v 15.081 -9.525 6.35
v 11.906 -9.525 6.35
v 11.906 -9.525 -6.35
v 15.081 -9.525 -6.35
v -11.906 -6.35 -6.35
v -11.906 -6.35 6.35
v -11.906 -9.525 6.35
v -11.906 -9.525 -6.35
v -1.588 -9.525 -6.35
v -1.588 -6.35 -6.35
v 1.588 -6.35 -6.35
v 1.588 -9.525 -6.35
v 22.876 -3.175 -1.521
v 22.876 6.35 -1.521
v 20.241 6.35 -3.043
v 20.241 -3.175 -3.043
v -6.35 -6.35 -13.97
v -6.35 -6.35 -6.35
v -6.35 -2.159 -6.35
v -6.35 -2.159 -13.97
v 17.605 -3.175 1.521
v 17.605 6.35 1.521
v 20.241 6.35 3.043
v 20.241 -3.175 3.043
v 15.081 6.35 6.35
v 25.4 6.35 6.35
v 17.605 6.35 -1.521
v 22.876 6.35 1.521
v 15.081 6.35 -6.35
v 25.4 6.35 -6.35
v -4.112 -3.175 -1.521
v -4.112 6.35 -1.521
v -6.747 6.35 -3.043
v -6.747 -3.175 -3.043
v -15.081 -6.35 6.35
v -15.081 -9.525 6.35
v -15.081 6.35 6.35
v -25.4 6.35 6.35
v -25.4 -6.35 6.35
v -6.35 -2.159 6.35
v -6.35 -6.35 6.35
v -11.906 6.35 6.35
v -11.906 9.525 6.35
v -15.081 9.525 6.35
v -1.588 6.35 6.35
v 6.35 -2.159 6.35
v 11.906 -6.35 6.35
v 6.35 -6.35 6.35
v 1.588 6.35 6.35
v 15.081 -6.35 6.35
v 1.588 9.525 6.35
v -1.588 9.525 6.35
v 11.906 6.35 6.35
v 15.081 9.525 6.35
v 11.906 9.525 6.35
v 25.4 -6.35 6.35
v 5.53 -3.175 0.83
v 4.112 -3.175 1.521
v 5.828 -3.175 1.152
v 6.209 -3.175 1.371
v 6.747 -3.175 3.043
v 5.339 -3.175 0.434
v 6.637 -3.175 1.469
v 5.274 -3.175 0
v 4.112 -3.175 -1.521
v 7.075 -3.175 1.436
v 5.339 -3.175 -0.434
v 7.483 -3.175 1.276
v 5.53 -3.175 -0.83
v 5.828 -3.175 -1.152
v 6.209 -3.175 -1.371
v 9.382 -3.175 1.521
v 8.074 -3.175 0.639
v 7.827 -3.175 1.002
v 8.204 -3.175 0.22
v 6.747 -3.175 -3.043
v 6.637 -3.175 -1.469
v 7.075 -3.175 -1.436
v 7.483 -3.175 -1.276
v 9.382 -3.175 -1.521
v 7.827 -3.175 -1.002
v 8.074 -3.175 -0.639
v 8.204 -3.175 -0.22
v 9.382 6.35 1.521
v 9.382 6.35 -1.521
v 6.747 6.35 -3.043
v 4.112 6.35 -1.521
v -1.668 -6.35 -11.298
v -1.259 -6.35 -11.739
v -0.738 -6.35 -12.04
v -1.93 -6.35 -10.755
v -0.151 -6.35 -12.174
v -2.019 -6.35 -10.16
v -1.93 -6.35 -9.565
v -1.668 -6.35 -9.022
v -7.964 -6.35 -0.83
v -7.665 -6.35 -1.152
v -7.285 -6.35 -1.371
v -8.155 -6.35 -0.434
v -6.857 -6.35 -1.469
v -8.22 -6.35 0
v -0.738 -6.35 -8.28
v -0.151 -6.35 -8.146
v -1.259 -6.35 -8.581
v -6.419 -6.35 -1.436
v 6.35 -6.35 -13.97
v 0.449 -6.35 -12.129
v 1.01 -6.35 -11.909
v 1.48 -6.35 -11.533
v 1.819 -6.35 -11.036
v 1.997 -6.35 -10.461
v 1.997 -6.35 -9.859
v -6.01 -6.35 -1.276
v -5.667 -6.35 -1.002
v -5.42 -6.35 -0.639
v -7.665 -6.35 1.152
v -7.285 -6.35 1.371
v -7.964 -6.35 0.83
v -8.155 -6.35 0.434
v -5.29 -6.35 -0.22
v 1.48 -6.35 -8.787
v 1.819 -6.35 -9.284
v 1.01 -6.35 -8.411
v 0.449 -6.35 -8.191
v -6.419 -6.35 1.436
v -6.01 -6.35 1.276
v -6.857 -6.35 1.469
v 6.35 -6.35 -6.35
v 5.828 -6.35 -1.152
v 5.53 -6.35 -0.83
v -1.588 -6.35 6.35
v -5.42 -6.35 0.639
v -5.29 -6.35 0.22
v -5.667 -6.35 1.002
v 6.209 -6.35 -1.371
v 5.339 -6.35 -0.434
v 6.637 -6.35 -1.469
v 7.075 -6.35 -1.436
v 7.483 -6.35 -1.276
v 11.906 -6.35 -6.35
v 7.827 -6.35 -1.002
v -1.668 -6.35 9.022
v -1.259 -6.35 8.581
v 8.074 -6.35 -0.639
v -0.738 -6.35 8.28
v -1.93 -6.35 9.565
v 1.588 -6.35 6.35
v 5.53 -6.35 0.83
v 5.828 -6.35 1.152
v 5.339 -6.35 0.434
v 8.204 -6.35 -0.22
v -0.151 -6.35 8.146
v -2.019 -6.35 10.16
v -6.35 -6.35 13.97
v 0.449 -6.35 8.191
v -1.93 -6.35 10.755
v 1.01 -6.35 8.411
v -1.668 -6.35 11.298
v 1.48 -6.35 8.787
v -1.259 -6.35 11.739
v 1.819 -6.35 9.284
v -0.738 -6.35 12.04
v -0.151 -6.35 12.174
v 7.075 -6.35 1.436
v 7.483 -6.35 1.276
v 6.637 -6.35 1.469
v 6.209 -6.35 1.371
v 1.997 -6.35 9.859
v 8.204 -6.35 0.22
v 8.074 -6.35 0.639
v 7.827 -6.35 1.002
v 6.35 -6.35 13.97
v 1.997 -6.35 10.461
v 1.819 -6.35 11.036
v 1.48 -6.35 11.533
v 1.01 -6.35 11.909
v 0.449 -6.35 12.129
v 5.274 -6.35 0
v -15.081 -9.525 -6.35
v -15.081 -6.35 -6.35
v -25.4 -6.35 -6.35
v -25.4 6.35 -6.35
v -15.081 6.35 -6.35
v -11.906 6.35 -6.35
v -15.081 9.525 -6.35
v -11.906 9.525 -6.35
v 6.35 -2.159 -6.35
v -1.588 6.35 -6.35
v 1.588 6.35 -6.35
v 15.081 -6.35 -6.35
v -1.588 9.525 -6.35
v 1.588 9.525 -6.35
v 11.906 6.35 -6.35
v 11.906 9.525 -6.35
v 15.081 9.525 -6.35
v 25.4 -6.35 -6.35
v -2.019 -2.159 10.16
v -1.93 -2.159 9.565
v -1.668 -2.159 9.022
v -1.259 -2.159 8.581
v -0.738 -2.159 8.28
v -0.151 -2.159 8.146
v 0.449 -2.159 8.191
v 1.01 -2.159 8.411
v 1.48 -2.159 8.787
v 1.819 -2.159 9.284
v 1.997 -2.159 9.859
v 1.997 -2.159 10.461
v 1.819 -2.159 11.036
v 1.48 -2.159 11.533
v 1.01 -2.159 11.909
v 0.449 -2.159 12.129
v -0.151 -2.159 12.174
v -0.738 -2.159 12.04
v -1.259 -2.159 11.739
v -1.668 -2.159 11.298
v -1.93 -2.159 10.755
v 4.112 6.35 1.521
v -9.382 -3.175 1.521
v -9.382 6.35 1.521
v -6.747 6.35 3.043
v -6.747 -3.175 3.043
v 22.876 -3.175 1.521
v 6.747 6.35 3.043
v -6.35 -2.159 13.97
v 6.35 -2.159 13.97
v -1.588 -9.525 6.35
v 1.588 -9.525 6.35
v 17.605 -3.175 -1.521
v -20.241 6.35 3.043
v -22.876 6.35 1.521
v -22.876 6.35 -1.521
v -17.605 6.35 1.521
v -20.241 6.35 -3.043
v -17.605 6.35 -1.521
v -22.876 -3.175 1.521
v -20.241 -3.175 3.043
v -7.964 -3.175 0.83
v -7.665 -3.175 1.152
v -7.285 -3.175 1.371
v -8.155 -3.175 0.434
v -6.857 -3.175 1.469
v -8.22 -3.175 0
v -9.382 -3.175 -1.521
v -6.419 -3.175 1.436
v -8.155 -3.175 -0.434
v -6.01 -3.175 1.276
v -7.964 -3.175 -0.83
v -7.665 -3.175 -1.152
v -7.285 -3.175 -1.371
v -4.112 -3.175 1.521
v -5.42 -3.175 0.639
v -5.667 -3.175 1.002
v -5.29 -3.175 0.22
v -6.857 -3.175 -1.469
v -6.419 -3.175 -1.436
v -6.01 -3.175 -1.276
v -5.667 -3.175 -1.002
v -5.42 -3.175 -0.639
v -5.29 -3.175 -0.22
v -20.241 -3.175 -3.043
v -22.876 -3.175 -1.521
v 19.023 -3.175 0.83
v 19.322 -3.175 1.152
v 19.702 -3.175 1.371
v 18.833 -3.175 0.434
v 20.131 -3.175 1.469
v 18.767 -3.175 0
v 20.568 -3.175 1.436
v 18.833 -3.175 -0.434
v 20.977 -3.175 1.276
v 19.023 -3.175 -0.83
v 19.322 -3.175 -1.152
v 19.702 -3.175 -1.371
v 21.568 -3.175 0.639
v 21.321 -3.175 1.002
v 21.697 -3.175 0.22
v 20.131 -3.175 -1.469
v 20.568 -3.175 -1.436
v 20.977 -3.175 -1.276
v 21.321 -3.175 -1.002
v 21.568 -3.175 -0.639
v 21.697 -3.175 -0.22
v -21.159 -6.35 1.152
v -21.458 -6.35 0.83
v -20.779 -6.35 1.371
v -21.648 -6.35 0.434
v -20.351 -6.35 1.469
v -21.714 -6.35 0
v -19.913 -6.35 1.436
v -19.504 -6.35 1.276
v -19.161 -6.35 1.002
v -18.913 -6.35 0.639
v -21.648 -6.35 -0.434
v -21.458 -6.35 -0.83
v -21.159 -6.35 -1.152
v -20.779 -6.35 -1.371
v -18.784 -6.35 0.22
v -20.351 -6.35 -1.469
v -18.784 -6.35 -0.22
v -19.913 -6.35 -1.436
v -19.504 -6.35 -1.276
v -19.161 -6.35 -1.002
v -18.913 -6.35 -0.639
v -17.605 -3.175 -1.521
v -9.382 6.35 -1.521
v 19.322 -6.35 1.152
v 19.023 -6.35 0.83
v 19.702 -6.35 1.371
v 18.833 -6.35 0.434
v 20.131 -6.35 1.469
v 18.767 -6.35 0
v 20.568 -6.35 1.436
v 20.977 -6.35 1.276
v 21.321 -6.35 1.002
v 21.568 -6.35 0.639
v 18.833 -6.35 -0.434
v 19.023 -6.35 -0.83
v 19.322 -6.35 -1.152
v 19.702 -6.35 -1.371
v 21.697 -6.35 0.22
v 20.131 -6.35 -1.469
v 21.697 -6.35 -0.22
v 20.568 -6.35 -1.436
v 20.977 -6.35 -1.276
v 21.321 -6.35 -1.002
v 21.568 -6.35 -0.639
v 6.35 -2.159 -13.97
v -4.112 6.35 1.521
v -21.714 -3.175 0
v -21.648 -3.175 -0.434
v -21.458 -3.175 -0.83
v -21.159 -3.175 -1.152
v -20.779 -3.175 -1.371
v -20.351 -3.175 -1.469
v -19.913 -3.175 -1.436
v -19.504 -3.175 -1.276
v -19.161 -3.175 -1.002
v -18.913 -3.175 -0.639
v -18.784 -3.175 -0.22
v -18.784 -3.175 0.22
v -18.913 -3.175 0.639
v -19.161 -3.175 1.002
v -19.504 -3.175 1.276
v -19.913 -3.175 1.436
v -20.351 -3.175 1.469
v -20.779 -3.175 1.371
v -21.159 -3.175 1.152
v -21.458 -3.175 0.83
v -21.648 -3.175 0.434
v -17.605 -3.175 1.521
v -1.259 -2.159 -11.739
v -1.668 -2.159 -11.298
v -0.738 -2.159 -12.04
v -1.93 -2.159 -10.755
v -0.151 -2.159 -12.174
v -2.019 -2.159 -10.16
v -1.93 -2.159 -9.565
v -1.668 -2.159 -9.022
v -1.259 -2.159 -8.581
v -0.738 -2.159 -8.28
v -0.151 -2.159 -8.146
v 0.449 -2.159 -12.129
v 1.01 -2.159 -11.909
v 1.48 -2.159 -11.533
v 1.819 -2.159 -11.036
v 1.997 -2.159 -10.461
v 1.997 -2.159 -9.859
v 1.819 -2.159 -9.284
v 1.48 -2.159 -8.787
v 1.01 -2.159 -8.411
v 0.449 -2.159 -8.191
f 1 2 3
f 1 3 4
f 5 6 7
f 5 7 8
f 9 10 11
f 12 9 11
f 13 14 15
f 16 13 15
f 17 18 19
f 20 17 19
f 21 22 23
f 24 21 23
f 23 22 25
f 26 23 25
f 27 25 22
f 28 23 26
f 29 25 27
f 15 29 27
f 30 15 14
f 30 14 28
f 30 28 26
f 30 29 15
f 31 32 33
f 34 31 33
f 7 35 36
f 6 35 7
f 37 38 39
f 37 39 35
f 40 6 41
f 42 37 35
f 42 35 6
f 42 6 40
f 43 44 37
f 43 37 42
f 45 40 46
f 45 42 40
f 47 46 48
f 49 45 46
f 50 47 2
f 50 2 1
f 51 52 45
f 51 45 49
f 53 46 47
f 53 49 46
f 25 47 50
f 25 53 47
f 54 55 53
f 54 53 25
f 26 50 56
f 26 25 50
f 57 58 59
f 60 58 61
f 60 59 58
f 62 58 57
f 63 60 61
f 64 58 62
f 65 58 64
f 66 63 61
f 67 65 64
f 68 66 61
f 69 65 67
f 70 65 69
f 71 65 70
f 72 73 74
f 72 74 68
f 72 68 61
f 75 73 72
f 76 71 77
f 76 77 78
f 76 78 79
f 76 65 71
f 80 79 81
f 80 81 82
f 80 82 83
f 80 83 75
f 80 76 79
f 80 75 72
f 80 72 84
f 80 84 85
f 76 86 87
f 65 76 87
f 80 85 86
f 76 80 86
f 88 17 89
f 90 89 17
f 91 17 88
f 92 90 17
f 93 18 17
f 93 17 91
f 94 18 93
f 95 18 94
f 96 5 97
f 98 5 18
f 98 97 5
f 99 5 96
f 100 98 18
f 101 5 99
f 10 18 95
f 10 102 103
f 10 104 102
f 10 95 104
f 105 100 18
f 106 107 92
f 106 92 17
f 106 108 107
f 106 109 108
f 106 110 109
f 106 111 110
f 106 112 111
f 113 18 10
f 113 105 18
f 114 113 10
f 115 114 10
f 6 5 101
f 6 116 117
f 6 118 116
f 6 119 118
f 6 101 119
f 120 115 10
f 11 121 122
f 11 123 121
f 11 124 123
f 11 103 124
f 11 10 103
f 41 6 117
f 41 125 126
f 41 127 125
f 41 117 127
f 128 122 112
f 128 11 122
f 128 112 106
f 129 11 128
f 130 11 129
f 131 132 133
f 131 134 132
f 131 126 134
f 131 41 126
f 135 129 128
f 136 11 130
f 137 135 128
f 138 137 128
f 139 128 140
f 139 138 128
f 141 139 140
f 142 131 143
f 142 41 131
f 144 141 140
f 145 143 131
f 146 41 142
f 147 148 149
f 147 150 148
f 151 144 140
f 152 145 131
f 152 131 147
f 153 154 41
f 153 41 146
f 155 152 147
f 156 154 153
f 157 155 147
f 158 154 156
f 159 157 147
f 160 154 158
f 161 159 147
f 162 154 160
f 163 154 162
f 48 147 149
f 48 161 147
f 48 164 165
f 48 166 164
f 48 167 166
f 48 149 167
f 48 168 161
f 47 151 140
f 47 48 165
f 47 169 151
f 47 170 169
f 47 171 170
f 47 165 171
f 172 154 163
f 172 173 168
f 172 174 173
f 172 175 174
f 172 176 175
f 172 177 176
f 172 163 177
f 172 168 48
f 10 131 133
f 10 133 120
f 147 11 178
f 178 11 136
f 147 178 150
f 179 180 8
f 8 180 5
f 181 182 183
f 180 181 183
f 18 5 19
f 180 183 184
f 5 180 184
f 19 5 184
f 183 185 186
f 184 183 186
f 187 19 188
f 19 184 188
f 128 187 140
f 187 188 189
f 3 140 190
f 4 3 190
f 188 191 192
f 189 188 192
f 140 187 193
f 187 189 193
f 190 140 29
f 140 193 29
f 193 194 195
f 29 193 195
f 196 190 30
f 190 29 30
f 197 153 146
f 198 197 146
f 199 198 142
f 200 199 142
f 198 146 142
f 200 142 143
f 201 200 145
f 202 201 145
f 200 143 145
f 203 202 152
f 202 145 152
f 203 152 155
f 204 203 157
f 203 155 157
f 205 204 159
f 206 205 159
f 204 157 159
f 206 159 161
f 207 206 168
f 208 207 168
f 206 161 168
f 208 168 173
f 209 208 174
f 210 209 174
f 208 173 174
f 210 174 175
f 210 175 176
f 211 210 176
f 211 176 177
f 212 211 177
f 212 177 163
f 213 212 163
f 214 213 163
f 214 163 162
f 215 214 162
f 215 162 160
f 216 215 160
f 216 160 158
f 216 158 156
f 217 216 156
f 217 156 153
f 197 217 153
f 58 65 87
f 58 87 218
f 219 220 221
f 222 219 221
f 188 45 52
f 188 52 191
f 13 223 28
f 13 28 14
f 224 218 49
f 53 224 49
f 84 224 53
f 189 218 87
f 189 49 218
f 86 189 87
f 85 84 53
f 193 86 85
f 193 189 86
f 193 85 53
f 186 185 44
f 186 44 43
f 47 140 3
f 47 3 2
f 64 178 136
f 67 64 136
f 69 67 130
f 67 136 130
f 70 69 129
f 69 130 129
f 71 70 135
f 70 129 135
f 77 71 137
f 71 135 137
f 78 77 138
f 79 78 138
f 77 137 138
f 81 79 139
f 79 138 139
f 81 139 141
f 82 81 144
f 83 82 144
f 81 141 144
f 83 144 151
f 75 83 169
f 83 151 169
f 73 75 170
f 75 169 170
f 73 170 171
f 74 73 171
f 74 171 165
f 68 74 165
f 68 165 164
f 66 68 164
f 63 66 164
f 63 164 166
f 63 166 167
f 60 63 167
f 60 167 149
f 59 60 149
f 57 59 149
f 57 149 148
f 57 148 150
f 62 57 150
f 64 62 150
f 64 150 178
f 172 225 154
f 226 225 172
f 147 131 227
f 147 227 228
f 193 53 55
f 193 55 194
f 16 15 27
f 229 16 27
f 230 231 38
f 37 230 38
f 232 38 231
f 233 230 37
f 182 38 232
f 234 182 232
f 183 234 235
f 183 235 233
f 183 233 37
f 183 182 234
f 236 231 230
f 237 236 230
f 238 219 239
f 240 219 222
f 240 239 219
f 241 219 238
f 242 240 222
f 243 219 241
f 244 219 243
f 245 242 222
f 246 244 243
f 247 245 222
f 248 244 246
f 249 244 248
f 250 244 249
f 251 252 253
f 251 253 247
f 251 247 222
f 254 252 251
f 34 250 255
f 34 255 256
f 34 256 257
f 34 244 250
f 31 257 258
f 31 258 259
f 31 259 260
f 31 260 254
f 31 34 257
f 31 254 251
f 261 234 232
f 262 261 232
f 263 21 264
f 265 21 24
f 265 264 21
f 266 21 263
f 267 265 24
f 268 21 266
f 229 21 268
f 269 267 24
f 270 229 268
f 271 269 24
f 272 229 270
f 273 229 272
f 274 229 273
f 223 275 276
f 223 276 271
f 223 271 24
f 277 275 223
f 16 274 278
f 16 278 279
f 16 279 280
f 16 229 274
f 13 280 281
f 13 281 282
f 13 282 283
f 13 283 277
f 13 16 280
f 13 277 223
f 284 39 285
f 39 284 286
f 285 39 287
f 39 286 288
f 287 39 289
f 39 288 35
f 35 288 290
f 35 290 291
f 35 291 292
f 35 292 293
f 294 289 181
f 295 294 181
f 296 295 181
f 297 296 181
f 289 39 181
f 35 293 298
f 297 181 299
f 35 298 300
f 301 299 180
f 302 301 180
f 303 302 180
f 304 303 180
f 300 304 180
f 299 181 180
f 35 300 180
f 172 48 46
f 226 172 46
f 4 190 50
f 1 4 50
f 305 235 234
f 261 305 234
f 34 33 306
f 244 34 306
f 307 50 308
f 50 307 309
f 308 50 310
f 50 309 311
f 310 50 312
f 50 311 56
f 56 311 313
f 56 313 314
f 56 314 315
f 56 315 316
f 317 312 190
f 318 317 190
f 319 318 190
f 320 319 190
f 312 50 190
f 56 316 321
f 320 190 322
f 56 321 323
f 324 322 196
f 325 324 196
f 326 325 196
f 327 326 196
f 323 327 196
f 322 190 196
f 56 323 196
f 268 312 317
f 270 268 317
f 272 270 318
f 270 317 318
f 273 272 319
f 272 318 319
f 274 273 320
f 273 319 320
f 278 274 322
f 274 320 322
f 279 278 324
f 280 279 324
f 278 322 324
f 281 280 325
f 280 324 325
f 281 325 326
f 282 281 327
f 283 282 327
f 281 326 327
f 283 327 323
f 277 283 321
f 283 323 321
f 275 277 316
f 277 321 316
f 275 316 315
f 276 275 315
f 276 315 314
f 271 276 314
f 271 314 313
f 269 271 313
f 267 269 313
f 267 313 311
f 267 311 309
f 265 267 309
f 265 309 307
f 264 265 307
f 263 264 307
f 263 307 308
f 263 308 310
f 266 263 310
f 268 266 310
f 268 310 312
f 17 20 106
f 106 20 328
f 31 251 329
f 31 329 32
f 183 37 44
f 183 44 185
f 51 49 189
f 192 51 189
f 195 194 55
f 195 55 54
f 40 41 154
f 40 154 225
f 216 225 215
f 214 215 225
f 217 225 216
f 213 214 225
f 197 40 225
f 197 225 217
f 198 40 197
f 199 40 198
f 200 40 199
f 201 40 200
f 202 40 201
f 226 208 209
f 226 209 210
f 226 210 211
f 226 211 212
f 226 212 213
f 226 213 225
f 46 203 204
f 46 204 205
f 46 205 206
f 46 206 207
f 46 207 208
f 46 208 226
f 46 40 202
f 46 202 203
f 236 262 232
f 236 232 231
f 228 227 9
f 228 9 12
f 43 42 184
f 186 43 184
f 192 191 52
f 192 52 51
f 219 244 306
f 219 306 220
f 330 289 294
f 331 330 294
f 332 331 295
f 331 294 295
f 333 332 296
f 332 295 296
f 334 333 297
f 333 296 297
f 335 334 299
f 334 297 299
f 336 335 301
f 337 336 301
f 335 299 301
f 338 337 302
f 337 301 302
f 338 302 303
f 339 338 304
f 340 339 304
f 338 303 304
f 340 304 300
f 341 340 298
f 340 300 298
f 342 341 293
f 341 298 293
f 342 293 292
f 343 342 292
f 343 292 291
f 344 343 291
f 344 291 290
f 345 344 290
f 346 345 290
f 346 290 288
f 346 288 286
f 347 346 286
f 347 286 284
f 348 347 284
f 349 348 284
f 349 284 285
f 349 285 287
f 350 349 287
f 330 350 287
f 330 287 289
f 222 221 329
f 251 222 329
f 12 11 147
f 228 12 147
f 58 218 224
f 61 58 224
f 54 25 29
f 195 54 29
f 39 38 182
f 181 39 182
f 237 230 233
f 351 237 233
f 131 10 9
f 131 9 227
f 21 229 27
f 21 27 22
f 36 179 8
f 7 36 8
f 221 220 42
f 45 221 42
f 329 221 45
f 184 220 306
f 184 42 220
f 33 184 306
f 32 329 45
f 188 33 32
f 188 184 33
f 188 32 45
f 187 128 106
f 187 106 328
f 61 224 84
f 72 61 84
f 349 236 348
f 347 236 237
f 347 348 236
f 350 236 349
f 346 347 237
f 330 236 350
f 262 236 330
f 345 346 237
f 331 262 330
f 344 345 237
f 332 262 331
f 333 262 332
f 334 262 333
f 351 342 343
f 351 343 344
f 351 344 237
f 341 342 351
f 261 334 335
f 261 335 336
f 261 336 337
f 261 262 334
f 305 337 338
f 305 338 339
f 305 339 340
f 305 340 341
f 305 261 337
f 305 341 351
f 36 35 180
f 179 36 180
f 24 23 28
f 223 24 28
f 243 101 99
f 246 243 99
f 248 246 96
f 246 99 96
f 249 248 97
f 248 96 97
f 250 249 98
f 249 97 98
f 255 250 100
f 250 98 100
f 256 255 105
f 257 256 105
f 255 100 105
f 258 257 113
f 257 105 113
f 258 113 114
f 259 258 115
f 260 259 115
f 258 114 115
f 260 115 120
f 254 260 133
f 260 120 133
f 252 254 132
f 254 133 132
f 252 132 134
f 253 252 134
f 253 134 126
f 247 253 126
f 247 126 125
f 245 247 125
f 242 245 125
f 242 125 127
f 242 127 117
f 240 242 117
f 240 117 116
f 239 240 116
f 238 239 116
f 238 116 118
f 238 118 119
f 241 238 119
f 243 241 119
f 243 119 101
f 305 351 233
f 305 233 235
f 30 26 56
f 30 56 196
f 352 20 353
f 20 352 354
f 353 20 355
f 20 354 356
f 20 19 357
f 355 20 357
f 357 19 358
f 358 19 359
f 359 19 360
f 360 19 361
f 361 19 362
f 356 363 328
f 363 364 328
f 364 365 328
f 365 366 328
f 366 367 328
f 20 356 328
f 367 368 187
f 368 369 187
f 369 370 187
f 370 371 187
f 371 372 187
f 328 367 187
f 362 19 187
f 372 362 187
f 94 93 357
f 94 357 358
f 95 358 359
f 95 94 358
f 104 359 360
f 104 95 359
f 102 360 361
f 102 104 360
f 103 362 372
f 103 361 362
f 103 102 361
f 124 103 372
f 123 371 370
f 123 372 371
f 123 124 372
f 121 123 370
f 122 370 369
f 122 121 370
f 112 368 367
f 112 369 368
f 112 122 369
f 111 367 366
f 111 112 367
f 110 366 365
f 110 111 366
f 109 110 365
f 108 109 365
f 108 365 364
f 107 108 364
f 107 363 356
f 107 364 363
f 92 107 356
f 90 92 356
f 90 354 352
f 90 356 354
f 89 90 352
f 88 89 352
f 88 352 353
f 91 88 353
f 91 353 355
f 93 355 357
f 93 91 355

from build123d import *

# Parameters (mm, degrees)
SKETCH1_W               = 50.8
SKETCH1_H               = 12.7
BOSS_EXTRUDE1_DEPTH     = 6.35
SKETCH9_W               = 3.175
SKETCH9_H               = 12.7
BOSS_EXTRUDE3_DEPTH     = 3.175
LPATTERN1_COUNT         = 3
LPATTERN1_PITCH         = 13.49375
MIRROR2_COPY_1_SKETCH_W = 3.175
MIRROR2_COPY_1_SKETCH_H = 12.7
MIRROR2_COPY_1_DEPTH    = 3.175
MIRROR2_COPY_2_SKETCH_W = 3.175
MIRROR2_COPY_2_SKETCH_H = 12.7
MIRROR2_COPY_2_DEPTH    = 3.175
CUT_EXTRUDE1_DEPTH      = 9.525
LPATTERN2_COUNT         = 4
LPATTERN2_PITCH         = 13.49375
F_4_CLEARANCE_HOLE2_D   = 2.9464
LPATTERN3_COUNT         = 4
LPATTERN3_PITCH         = 13.49375
SKETCH13_W              = 12.7
SKETCH13_H              = 4.191
BOSS_EXTRUDE4_DEPTH     = 7.62
HOLE1_D                 = 4.0386


with BuildPart() as part:
    # Sketch1 → Boss-Extrude1 (new, symmetric)
    with BuildSketch(Plane(origin=(0, 0, 0), x_dir=(1, 0, 0), z_dir=(0, 1, 0))):
        Rectangle(SKETCH1_W, SKETCH1_H)
    extrude(amount=BOSS_EXTRUDE1_DEPTH, both=True)

    # Sketch9 → Boss-Extrude3 (add)
    with BuildSketch(Plane(origin=(0, 6.35, 0), x_dir=(1, 0, 0), z_dir=(0, 1, 0))):
        with Locations((-13.49375, 0)):
            Rectangle(SKETCH9_W, SKETCH9_H)
    boss_extrude3 = extrude(amount=BOSS_EXTRUDE3_DEPTH)

    # LPattern1: Boss-Extrude3 ×3
    with Locations(*[(i * LPATTERN1_PITCH, 0, 0) for i in range(1, LPATTERN1_COUNT)]):
        add(boss_extrude3)

    # Mirror2: Boss-Extrude3 across plane
    add(boss_extrude3.mirror(Plane.ZX))

    # Mirror2 copy 1 sketch → Mirror2 copy 1 (add)
    with BuildSketch(Plane(origin=(13.49375, -6.35, 0), x_dir=(1, 0, 0), z_dir=(0, -1, 0))):
        with Locations((-13.49375, 0)):
            Rectangle(MIRROR2_COPY_1_SKETCH_W, MIRROR2_COPY_1_SKETCH_H)
    extrude(amount=MIRROR2_COPY_1_DEPTH)

    # Mirror2 copy 2 sketch → Mirror2 copy 2 (add)
    with BuildSketch(Plane(origin=(26.9875, -6.35, 0), x_dir=(1, 0, 0), z_dir=(0, -1, 0))):
        with Locations((-13.49375, 0)):
            Rectangle(MIRROR2_COPY_2_SKETCH_W, MIRROR2_COPY_2_SKETCH_H)
    extrude(amount=MIRROR2_COPY_2_DEPTH)

    # Sketch10 → Cut-Extrude1 (cut)
    with BuildSketch(Plane(origin=(0, 6.35, 0), x_dir=(1, 0, 0), z_dir=(0, 1, 0))):
        Polygon((-17.605375, 1.521462297), (-20.240625, 3.042924594), (-22.875875, 1.521462297), (-22.875875, -1.521462297), (-20.240625, -3.042924594), (-17.605375, -1.521462297), align=None)
    cut_extrude1 = extrude(amount=-CUT_EXTRUDE1_DEPTH, mode=Mode.SUBTRACT)

    # LPattern2: Cut-Extrude1 ×4
    with Locations(*[(i * LPATTERN2_PITCH, 0, 0) for i in range(1, LPATTERN2_COUNT)]):
        add(cut_extrude1, mode=Mode.SUBTRACT)

    # #4 Clearance Hole2 (through all)
    with Locations(Plane(origin=(0, -3.175, 0), x_dir=(1, 0, 0), z_dir=(0, 1, 0))):
        with Locations((-20.240625, 0)):
            f_4_clearance_hole2 = Hole(F_4_CLEARANCE_HOLE2_D / 2)

    # LPattern3: #4 Clearance Hole2 ×4
    with Locations(*[(i * LPATTERN3_PITCH, 0, 0) for i in range(1, LPATTERN3_COUNT)]):
        add(f_4_clearance_hole2, mode=Mode.SUBTRACT)

    # Sketch13 → Boss-Extrude4 (add)
    with BuildSketch(Plane.XY.offset(6.35)):
        with Locations((0, -4.2545)):
            Rectangle(SKETCH13_W, SKETCH13_H)
    boss_extrude4 = extrude(amount=BOSS_EXTRUDE4_DEPTH)

    # Hole1 (through all)
    with Locations(Plane(origin=(0, -2.159, 0), x_dir=(1, 0, 0), z_dir=(0, 1, 0))):
        with Locations((0, -10.16)):
            hole1 = Hole(HOLE1_D / 2)

    # Mirror4: Boss-Extrude4, Hole1 across plane
    add(boss_extrude4.mirror(Plane.XY))
    add(hole1.mirror(Plane.XY), mode=Mode.SUBTRACT)


solid = part.part
